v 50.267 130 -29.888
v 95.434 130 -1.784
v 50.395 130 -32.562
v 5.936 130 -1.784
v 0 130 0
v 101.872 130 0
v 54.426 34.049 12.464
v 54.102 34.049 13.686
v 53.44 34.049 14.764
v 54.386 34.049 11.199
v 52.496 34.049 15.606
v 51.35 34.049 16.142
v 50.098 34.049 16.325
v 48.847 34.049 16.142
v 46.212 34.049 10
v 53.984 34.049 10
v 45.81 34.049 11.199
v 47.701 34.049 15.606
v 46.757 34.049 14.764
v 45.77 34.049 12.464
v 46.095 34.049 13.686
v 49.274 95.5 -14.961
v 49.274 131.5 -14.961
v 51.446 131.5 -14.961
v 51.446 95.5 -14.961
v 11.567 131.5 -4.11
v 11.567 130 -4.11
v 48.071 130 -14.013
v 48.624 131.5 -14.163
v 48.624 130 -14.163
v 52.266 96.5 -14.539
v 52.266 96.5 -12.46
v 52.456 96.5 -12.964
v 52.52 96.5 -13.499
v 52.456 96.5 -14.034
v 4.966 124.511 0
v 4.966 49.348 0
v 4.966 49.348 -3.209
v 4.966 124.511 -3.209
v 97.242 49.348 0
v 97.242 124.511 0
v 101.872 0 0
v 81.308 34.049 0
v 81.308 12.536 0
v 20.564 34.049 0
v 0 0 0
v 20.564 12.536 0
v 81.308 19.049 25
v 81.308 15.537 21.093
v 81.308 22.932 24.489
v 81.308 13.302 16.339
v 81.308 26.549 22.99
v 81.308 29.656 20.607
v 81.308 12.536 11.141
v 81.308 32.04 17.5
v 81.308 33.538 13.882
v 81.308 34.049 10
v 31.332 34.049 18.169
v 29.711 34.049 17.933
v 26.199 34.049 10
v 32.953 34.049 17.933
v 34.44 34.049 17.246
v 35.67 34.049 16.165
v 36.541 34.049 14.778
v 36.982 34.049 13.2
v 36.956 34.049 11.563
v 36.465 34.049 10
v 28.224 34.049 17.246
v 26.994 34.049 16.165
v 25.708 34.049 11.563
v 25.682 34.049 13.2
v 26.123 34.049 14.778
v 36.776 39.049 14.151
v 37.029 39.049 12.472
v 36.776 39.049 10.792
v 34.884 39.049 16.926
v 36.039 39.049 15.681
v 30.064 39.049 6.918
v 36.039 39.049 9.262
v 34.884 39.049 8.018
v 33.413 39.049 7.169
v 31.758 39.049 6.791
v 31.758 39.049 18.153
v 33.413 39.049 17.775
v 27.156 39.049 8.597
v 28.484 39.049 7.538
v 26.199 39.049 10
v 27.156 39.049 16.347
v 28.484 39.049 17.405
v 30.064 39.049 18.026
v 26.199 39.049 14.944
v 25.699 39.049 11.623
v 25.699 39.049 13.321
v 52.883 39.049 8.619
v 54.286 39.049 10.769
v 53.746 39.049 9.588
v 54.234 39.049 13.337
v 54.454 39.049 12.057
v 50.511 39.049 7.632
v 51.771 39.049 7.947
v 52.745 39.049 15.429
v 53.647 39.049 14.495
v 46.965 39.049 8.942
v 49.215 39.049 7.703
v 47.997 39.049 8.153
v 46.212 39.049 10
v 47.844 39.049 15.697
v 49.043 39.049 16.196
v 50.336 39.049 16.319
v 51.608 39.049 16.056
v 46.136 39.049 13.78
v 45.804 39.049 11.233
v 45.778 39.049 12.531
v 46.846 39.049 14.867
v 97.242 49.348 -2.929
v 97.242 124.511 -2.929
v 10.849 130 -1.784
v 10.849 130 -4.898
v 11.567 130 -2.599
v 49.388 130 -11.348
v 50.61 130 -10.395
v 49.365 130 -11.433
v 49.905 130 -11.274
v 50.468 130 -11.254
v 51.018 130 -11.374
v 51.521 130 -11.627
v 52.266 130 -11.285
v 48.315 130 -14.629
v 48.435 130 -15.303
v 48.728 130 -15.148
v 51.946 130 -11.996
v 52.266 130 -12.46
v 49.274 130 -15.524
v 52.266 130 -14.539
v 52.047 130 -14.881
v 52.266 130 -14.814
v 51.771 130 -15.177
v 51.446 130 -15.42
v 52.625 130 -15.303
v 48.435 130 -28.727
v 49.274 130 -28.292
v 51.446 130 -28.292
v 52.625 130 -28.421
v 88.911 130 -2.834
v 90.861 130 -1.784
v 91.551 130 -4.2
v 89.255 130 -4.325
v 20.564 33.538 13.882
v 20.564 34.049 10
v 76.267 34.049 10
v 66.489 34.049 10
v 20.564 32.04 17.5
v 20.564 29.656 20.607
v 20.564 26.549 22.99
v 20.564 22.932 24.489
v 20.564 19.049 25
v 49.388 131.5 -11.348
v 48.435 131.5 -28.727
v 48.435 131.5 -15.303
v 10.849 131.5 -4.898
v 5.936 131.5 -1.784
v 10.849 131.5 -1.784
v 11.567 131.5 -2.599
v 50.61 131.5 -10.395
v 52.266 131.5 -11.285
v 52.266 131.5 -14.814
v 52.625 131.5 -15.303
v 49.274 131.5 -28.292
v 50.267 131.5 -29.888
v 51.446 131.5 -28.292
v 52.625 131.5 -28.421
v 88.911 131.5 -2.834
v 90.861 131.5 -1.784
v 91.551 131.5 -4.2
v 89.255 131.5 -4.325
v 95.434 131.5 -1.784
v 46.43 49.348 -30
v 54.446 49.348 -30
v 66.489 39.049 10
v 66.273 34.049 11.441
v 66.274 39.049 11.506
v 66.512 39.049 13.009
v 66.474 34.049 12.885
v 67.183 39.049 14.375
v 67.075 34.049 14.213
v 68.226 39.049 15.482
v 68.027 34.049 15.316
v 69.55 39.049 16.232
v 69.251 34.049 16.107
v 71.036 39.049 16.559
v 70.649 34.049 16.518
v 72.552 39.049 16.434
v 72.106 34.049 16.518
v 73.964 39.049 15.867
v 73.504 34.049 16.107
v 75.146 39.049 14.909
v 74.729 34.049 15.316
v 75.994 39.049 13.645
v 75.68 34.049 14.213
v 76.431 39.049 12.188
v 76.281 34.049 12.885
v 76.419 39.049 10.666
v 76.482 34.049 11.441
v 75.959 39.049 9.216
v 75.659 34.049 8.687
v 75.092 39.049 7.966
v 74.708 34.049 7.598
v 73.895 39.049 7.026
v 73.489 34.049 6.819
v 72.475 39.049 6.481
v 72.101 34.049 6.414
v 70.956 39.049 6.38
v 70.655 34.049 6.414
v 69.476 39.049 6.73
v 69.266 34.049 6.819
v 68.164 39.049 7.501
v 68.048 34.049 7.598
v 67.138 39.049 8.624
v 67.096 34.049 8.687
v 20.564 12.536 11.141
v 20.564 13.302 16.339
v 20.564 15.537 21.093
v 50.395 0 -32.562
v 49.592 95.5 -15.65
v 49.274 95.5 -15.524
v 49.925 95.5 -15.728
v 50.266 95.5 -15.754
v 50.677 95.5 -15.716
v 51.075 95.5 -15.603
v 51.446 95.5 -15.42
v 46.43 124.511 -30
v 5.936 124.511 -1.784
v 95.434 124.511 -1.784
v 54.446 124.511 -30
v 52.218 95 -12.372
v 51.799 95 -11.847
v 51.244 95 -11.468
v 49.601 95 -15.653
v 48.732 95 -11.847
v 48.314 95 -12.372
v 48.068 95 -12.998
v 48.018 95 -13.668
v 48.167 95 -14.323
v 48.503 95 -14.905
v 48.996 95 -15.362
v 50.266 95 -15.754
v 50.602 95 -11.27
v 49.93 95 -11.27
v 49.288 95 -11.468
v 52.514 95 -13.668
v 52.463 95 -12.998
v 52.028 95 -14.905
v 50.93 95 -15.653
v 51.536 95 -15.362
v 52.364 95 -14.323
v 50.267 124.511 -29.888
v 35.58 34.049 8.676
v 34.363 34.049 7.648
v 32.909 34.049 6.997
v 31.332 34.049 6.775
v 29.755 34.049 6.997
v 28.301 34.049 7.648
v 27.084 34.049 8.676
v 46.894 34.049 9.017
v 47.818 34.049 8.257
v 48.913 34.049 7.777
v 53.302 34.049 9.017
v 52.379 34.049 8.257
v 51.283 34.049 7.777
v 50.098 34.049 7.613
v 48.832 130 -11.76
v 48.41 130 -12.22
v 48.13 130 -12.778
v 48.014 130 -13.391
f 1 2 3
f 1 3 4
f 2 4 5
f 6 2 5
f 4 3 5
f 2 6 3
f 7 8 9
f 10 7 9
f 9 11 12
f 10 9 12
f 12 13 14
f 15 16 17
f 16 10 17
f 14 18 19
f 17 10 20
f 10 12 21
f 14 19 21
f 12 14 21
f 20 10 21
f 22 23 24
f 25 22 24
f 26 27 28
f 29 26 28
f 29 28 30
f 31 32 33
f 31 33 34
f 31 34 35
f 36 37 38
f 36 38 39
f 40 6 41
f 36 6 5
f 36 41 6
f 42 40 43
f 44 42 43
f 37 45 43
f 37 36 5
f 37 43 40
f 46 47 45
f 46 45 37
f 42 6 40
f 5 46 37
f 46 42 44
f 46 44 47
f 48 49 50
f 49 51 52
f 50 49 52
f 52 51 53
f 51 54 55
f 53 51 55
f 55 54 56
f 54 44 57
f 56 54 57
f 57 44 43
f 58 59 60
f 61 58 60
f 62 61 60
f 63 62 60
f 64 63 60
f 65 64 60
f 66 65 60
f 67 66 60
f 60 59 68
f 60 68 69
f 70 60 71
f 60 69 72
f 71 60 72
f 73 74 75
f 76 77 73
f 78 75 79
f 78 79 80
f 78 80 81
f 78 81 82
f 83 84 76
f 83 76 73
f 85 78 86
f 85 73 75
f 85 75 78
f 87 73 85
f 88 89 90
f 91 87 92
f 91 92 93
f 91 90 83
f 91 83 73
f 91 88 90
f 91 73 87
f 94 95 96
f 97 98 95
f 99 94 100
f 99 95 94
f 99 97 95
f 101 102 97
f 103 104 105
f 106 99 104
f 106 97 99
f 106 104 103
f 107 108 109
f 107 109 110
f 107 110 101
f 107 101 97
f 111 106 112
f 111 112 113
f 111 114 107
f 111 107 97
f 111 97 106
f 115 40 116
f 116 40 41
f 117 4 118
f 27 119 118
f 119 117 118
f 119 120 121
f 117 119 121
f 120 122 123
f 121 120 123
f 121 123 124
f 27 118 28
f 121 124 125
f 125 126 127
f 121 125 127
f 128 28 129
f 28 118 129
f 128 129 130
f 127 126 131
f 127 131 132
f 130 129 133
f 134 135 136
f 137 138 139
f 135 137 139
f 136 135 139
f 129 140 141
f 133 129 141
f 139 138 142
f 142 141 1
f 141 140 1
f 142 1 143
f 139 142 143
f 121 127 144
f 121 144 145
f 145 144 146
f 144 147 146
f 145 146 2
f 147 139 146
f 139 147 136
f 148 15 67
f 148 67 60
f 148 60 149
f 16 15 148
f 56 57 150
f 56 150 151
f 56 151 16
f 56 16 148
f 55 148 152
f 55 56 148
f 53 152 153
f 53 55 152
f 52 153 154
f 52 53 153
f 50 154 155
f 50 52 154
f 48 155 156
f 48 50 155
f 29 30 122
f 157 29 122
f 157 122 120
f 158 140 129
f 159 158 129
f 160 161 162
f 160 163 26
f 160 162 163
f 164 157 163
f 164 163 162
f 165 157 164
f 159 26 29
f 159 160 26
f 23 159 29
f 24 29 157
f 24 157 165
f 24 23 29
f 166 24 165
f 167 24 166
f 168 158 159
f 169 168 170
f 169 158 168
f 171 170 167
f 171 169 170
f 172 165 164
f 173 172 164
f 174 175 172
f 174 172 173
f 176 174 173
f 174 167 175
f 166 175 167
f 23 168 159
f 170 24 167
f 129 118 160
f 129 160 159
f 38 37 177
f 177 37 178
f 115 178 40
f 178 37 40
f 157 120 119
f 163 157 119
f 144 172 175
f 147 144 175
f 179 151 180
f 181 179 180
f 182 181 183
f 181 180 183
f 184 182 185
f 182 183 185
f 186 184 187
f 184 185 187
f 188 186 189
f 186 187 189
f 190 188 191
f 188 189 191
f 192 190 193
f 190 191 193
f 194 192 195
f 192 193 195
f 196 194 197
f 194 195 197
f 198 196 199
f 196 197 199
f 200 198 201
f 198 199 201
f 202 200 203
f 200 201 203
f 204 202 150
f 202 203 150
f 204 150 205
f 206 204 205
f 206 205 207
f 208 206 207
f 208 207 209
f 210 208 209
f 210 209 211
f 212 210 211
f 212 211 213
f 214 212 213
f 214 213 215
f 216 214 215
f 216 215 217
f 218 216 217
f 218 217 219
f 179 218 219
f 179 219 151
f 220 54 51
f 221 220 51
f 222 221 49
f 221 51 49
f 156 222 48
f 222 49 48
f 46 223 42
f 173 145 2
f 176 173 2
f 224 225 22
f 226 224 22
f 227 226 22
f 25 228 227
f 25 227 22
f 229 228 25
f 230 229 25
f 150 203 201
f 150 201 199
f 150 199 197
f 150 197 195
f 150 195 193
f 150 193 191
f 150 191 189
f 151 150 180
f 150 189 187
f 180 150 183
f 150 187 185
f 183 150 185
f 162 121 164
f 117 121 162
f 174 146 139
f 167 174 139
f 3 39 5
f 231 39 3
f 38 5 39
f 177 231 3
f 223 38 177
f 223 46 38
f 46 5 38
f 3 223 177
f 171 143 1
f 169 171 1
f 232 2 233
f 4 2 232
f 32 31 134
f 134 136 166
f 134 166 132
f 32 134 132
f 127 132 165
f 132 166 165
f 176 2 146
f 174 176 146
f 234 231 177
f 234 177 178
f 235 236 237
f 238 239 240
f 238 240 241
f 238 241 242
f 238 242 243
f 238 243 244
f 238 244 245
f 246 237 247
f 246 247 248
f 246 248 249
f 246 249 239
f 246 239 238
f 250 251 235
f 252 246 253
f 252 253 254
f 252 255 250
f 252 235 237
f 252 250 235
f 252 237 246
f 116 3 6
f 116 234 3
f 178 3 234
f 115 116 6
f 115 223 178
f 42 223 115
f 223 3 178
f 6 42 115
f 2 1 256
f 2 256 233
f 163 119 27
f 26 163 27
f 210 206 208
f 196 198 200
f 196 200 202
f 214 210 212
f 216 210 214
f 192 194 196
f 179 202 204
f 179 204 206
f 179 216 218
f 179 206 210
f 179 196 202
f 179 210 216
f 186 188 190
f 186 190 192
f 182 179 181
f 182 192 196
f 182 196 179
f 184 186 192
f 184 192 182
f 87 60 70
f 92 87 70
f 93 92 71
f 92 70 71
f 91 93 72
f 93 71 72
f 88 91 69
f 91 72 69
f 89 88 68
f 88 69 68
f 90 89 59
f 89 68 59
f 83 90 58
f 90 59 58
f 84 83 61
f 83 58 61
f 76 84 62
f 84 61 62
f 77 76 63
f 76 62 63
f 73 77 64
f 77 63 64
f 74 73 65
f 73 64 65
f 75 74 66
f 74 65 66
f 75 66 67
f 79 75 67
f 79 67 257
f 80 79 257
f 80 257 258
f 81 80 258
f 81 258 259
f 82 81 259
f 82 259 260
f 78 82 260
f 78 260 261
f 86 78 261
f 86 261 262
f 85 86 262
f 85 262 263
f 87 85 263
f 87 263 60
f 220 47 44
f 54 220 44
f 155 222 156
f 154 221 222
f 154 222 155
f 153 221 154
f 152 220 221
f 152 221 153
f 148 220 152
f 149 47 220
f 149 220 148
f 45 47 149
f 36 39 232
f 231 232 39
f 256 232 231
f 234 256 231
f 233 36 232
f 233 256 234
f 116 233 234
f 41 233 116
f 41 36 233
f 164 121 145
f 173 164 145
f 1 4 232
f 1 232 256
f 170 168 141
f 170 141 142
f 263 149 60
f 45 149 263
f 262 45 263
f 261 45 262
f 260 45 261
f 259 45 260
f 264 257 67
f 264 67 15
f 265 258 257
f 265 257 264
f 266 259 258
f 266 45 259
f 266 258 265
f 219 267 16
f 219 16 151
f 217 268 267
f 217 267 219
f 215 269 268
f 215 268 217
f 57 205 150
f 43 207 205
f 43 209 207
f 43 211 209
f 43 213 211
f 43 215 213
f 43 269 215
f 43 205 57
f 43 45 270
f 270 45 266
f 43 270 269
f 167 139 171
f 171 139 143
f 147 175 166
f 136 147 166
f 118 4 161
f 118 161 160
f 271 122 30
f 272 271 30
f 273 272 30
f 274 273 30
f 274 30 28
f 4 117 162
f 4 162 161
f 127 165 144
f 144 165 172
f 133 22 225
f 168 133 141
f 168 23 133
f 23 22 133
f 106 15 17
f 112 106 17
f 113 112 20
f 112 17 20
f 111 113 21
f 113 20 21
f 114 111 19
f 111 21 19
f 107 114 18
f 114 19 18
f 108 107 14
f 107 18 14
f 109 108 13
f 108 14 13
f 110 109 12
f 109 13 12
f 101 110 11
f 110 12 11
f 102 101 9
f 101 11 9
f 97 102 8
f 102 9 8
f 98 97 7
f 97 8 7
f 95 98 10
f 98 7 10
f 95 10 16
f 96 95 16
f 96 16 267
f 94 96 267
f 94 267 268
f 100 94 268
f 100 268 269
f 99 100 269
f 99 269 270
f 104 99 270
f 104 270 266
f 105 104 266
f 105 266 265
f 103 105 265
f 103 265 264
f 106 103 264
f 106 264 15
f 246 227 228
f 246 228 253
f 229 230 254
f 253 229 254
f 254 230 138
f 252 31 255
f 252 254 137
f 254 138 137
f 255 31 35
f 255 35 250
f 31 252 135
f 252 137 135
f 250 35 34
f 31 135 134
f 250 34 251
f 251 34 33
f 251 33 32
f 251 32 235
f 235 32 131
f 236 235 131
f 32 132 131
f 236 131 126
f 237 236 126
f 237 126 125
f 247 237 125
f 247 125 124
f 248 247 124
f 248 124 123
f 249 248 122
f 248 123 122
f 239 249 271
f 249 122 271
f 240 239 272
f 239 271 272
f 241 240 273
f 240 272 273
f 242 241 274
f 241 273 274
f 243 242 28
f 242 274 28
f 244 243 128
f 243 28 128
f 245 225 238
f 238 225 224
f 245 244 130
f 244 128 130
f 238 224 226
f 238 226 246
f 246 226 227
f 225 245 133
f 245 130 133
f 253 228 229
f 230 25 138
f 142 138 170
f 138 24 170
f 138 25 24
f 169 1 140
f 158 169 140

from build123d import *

# Parameters (mm, degrees)
BOSS_EXTRUDE2_DEPTH  = 130
CUT_EXTRUDE2_DEPTH   = 20
SKETCH8_W            = 92.275500819
SKETCH8_H            = 75.162589758
CUT_EXTRUDE3_DEPTH   = 30
SKETCH10_W           = 60.744023663
SKETCH10_H           = 21.51350838
BOSS_EXTRUDE3_DEPTH  = 25
FILLET1_R            = 15
FILLET2_R            = 18
SKETCH13_R           = 5.696863497
BOSS_EXTRUDE4_DEPTH  = 5
SKETCH14_R           = 5.104237625
BOSS_EXTRUDE5_DEPTH  = 5
SKETCH15_R           = 4.356425027
BOSS_EXTRUDE6_DEPTH  = 5
BOSS_EXTRUDE7_DEPTH  = 1.5
BOSS_EXTRUDE8_DEPTH  = 1.5
BOSS_EXTRUDE9_DEPTH  = 1.5
SKETCH19_R           = 2.254219404
BOSS_EXTRUDE10_DEPTH = 35
CUT_EXTRUDE4_DEPTH   = 169.339518256
CUT_EXTRUDE7_DEPTH   = 35
SKETCH23_W           = 2.171886621
SKETCH23_H           = 13.331749198
CUT_EXTRUDE9_DEPTH   = 36


with BuildPart() as part:
    # Sketch1 → Boss-Extrude2 (new body)
    with BuildSketch(Plane(origin=(0, 0, 0), x_dir=(1, 0, 0), z_dir=(0, 1, 0))):
        Polygon((0, 0), (50.395449795, 32.562227195), (101.871952797, 0), align=None)
    extrude(amount=BOSS_EXTRUDE2_DEPTH)

    # Sketch9 → Cut-Extrude2 (cut)
    with BuildSketch(Plane(origin=(0, 130, 0), x_dir=(1, 0, 0), z_dir=(0, 1, 0))):
        Polygon((5.935675774, 1.783636913), (50.266826947, 29.887913883), (95.434414934, 1.783636913), align=None)
    extrude(amount=-CUT_EXTRUDE2_DEPTH, mode=Mode.SUBTRACT)

    # Sketch8 → Cut-Extrude3 (cut)
    with BuildSketch(Plane.XY):
        with Locations((51.103750037, 86.929527723)):
            Rectangle(SKETCH8_W, SKETCH8_H)
    extrude(amount=-CUT_EXTRUDE3_DEPTH, mode=Mode.SUBTRACT)

    # Sketch10 → Boss-Extrude3 (add)
    with BuildSketch(Plane.XY):
        with Locations((50.935976399, 23.292530585)):
            Rectangle(SKETCH10_W, SKETCH10_H)
    extrude(amount=BOSS_EXTRUDE3_DEPTH)

    # Fillet1
    fillet1_edges = [part.edges().sort_by_distance(p)[0] for p in [
        (50.935976399, 34.049284775, 25),
    ]]
    fillet(fillet1_edges, radius=FILLET1_R)

    # Fillet2
    # the kernel refuses this fillet: 18 mm, written as the material it takes off along each edge
    with BuildSketch(Plane(origin=(115.954462644, 12.535776395, 25), x_dir=(0, 1, 0), z_dir=(-1, 0, 0))) as fillet2_piece_1:
        with BuildLine():
            CenterArc((18, 13.858589765), FILLET2_R, 180, 50.346853939)
            Line((0, 13.858589765), (-0.36, 13.858589765))
            Line((-0.36, 13.858589765), (-0.36, 0))
            Line((-0.36, 0), (0, -0.36))
            ThreePointArc((0, -0.36), (3.25675419, -0.36), (6.283778548, -0.277171795))
            Line((6.283778548, -0.277171795), (6.513508381, 0))
        make_face()
    extrude(amount=130.03697249, mode=Mode.SUBTRACT)

    # Sketch13 → Boss-Extrude4 (add)
    with BuildSketch(Plane(origin=(0, 34.049284775, 0), x_dir=(1, 0, 0), z_dir=(0, 1, 0))):
        with Locations(Location((31.332063776, -12.47170285, 0), (0, 0, 154.286535708))):
            Circle(SKETCH13_R)
    extrude(amount=BOSS_EXTRUDE4_DEPTH)

    # Sketch14 → Boss-Extrude5 (add)
    with BuildSketch(Plane(origin=(0, 34.049284775, 0), x_dir=(1, 0, 0), z_dir=(0, 1, 0))):
        with Locations(Location((71.377663065, -11.466373998, 0), (0, 0, 163.30448122))):
            Circle(SKETCH14_R)
    extrude(amount=BOSS_EXTRUDE5_DEPTH)

    # Sketch15 → Boss-Extrude6 (add)
    with BuildSketch(Plane(origin=(0, 34.049284775, 0), x_dir=(1, 0, 0), z_dir=(0, 1, 0))):
        with Locations(Location((50.098202355, -11.969038424, 0), (0, 0, 153.128894057))):
            Circle(SKETCH15_R)
    extrude(amount=BOSS_EXTRUDE6_DEPTH)


with BuildPart() as body_2:
    # Sketch16 → Boss-Extrude7 (new body)
    with BuildSketch(Plane(origin=(0, 130, 0), x_dir=(1, 0, 0), z_dir=(0, 1, 0))):
        Polygon((10.848743574, 4.898336499), (50.56151381, 15.891818457), (50.609643394, 10.395077478), (10.848743574, 1.783636913), (5.935675774, 1.783636913), align=None)
    extrude(amount=BOSS_EXTRUDE7_DEPTH)

    # Sketch17 → Boss-Extrude8 (add)
    with BuildSketch(Plane(origin=(0, 130, 0), x_dir=(1, 0, 0), z_dir=(0, 1, 0))):
        Polygon((91.550521692, 4.200281597), (50.56151381, 15.891818457), (50.609643394, 10.395077478), (90.861207853, 1.783636913), (95.434414934, 1.783636913), align=None)
    extrude(amount=BOSS_EXTRUDE8_DEPTH)

    # Sketch18 → Boss-Extrude9 (add)
    with BuildSketch(Plane(origin=(0, 130, 0), x_dir=(1, 0, 0), z_dir=(0, 1, 0))):
        Polygon((48.435317206, 28.726805821), (48.435317206, 15.303234385), (50.56151381, 15.891818457), (52.625013027, 15.303234385), (52.625013027, 28.4205981), (50.266826947, 29.887913883), align=None)
    extrude(amount=BOSS_EXTRUDE9_DEPTH)

    # Sketch19 → Boss-Extrude10 (add)
    with BuildSketch(Plane.XZ.offset(-130)):
        with Locations(Location((50.265757164, -13.499292504, 0), (0, 0, 270))):
            Circle(SKETCH19_R)
    extrude(amount=BOSS_EXTRUDE10_DEPTH)

    # Sketch20 → Cut-Extrude4 (cut, through all)
    with BuildSketch(Plane(origin=(0, 130, 0), x_dir=(-1, 0, 0), z_dir=(0, -1, 0))):
        Polygon((-11.566591565, 4.110130279), (-48.623978622, 14.163321071), (-49.387681074, 11.348213118), (-11.566591565, 2.598984994), align=None)
    extrude(amount=-CUT_EXTRUDE4_DEPTH, mode=Mode.SUBTRACT)

    # Sketch21 → Cut-Extrude7 (cut)
    with BuildSketch(Plane(origin=(0, 131.5, 0), x_dir=(1, 0, 0), z_dir=(0, 1, 0))):
        Polygon((52.265848542, 14.814079801), (52.265848542, 11.285215779), (88.911057341, 2.833584376), (89.255107257, 4.325341463), align=None)
    extrude(amount=-CUT_EXTRUDE7_DEPTH, mode=Mode.SUBTRACT)

    # Sketch23 → Cut-Extrude9 (cut)
    with BuildSketch(Plane(origin=(0, 131.5, 0), x_dir=(1, 0, 0), z_dir=(0, 1, 0))):
        with Locations((50.359976677, 21.626478171)):
            Rectangle(SKETCH23_W, SKETCH23_H)
    extrude(amount=-CUT_EXTRUDE9_DEPTH, mode=Mode.SUBTRACT)


solid = Compound([part.part, body_2.part])
